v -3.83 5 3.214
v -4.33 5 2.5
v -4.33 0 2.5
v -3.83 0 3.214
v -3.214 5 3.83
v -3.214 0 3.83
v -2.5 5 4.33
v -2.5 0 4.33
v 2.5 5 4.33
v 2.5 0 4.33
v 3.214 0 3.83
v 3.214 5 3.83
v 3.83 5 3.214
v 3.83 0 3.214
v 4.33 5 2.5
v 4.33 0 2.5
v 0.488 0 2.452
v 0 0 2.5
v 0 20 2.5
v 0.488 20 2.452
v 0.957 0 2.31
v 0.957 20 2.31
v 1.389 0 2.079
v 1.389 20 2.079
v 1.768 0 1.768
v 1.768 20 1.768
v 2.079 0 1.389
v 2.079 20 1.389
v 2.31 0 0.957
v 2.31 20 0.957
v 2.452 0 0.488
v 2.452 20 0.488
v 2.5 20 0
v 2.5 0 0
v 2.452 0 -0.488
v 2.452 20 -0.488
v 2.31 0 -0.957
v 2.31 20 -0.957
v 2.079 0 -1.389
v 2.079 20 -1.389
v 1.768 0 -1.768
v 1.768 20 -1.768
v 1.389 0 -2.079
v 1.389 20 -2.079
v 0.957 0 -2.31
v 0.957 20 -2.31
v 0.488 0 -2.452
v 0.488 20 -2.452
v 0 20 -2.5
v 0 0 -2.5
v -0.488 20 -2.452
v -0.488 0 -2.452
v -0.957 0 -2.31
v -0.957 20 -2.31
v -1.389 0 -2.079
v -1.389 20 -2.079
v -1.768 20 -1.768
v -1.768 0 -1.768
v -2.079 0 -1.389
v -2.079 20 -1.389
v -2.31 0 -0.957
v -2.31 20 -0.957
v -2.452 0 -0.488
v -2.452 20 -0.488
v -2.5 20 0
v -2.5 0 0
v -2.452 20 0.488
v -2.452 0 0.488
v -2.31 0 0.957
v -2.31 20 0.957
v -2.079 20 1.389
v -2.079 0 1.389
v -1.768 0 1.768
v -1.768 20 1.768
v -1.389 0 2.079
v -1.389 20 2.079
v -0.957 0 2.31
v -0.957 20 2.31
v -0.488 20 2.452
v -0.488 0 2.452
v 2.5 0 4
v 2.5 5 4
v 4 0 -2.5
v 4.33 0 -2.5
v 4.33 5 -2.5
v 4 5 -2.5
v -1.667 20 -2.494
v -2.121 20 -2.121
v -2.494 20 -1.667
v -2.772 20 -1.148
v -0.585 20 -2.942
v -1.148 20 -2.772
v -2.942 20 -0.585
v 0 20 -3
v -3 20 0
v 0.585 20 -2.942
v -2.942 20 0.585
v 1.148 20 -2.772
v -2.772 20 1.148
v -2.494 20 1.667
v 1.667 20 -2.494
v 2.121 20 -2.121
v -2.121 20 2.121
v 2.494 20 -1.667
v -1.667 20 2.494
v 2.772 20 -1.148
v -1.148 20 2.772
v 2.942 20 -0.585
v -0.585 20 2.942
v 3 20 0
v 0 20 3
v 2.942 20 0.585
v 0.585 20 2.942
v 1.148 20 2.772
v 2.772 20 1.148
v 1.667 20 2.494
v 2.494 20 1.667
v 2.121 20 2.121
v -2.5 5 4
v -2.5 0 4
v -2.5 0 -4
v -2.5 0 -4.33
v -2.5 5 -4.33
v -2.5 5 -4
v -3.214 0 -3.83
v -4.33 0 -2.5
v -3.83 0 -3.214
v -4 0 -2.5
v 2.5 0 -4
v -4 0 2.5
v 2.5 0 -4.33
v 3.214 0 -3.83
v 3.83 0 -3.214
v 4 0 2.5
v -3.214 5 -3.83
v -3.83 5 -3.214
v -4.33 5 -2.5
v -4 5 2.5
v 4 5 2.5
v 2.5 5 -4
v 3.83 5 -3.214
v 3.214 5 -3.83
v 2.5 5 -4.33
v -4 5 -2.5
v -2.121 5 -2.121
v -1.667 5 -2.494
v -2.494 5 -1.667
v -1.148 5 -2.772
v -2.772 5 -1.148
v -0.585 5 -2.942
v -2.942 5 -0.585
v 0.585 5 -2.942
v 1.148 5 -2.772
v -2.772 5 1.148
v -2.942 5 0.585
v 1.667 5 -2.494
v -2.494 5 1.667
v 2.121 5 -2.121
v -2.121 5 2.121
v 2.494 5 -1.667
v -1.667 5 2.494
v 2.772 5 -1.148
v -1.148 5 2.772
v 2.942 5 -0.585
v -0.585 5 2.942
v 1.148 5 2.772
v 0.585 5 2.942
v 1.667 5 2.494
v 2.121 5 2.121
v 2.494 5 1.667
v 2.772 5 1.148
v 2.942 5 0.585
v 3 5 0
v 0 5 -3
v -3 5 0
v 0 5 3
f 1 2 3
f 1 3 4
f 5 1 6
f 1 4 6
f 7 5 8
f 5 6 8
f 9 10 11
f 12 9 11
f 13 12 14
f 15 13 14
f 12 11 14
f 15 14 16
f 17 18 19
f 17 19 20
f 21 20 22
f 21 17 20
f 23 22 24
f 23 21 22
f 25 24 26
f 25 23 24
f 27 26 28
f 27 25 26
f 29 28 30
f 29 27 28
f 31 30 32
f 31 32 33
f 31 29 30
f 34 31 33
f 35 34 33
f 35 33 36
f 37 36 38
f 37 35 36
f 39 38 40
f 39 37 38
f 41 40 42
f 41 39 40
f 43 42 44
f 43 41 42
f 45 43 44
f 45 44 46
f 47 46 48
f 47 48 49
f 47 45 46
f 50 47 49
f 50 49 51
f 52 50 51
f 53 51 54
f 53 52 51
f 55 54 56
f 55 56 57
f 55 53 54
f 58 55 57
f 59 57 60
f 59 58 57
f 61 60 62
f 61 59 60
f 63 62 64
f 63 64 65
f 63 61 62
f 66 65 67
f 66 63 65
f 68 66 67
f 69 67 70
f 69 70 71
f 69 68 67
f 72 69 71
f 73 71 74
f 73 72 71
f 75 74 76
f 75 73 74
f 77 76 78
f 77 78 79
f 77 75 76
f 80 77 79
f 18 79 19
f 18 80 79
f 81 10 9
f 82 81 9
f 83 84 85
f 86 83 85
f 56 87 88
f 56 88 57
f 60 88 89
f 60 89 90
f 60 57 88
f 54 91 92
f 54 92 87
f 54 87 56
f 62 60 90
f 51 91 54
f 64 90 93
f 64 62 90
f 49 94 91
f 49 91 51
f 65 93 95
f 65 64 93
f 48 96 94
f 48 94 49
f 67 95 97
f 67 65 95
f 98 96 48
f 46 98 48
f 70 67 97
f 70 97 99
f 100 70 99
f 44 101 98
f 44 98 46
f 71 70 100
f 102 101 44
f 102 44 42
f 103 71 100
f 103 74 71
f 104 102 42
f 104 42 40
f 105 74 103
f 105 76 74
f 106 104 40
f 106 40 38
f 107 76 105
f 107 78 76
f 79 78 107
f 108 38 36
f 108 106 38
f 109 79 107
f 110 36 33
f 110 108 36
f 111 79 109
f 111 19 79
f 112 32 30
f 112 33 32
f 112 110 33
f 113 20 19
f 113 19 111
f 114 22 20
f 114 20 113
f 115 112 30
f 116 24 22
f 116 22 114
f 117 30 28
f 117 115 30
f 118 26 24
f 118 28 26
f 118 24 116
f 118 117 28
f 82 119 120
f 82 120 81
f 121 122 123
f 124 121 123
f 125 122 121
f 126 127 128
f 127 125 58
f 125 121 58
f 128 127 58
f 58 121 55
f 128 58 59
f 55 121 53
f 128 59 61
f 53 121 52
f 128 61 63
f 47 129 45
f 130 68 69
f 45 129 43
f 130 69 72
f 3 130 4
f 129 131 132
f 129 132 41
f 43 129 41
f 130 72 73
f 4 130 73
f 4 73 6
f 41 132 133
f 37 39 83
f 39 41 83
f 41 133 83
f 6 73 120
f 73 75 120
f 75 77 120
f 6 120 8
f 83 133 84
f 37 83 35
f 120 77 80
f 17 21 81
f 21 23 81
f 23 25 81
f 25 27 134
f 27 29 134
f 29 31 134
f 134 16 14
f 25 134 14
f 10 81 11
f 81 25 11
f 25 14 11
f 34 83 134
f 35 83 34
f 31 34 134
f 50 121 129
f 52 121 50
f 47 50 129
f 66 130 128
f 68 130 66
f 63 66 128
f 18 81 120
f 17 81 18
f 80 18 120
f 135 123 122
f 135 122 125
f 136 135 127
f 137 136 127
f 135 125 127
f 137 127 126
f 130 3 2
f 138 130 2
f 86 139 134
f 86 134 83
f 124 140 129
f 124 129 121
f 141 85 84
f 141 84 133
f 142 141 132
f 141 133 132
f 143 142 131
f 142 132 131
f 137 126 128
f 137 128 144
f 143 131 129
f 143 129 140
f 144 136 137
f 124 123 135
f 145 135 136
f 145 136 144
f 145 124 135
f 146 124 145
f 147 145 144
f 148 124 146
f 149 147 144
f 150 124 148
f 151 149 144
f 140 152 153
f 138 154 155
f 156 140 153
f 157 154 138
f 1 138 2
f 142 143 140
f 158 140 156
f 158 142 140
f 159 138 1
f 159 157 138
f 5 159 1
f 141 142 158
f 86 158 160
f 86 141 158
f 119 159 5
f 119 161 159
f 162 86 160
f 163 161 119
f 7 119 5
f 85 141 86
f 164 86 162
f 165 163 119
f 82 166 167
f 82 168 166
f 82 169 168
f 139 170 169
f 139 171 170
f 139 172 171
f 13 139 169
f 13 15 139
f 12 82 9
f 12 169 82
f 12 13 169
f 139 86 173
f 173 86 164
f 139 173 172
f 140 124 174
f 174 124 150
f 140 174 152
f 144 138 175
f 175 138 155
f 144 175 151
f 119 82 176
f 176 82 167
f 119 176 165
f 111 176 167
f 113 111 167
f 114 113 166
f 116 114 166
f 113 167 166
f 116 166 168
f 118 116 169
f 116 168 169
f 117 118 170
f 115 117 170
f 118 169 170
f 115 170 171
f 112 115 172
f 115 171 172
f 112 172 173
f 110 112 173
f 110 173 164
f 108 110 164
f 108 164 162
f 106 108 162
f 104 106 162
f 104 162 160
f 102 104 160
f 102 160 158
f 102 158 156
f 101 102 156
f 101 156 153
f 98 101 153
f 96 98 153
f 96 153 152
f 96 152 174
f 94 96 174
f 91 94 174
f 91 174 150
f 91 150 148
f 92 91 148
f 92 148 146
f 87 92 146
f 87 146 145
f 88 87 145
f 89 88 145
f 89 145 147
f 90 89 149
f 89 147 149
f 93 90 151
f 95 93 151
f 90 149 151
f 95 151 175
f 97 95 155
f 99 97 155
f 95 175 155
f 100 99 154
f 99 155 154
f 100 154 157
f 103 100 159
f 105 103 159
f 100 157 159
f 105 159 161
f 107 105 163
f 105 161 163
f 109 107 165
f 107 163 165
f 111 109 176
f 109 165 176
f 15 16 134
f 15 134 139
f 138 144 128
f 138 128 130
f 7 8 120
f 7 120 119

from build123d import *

# Parameters (mm, degrees)
SKETCH1_R           = 3
SKETCH1_R_2         = 2.5
BOSS_EXTRUDE1_DEPTH = 20
SKETCH1_3_R         = 5
SKETCH1_3_R_2       = 3
BOSS_EXTRUDE2_DEPTH = 5
SKETCH4_W           = 5
SKETCH4_H           = 5
CUT_EXTRUDE2_DEPTH  = 1
SKETCH5_W           = 5
SKETCH5_H           = 5
CUT_EXTRUDE3_DEPTH  = 1
SKETCH6_W           = 5
SKETCH6_H           = 5
CUT_EXTRUDE4_DEPTH  = 1
SKETCH7_W           = 5
SKETCH7_H           = 5
CUT_EXTRUDE5_DEPTH  = 1


with BuildPart() as part:
    # Sketch1 → Boss-Extrude1 (new body)
    with BuildSketch(Plane(origin=(0, 0, 0), x_dir=(1, 0, 0), z_dir=(0, 1, 0))):
        Circle(SKETCH1_R)
        Circle(SKETCH1_R_2, mode=Mode.SUBTRACT)
    extrude(amount=BOSS_EXTRUDE1_DEPTH)

    # Sketch1<3> → Boss-Extrude2 (add)
    with BuildSketch(Plane(origin=(0, 0, 0), x_dir=(1, 0, 0), z_dir=(0, 1, 0))):
        Circle(SKETCH1_3_R)
        Circle(SKETCH1_3_R_2, mode=Mode.SUBTRACT)
    extrude(amount=BOSS_EXTRUDE2_DEPTH)

    # Sketch4 → Cut-Extrude2 (cut)
    with BuildSketch(Plane.XY.offset(5)):
        with Locations((0, 2.5)):
            Rectangle(SKETCH4_W, SKETCH4_H)
    extrude(amount=-CUT_EXTRUDE2_DEPTH, mode=Mode.SUBTRACT)

    # Sketch5 → Cut-Extrude3 (cut)
    with BuildSketch(Plane.ZY.offset(5)):
        with Locations((0, 2.5)):
            Rectangle(SKETCH5_W, SKETCH5_H)
    extrude(amount=-CUT_EXTRUDE3_DEPTH, mode=Mode.SUBTRACT)

    # Sketch6 → Cut-Extrude4 (cut)
    with BuildSketch(Plane(origin=(0, 0, -5), x_dir=(-1, 0, 0), z_dir=(0, 0, -1))):
        with Locations((0, 2.5)):
            Rectangle(SKETCH6_W, SKETCH6_H)
    extrude(amount=-CUT_EXTRUDE4_DEPTH, mode=Mode.SUBTRACT)

    # Sketch7 → Cut-Extrude5 (cut)
    with BuildSketch(Plane(origin=(5, 0, 0), x_dir=(0, 0, -1), z_dir=(1, 0, 0))):
        with Locations((0, 2.5)):
            Rectangle(SKETCH7_W, SKETCH7_H)
    extrude(amount=-CUT_EXTRUDE5_DEPTH, mode=Mode.SUBTRACT)


solid = part.part
